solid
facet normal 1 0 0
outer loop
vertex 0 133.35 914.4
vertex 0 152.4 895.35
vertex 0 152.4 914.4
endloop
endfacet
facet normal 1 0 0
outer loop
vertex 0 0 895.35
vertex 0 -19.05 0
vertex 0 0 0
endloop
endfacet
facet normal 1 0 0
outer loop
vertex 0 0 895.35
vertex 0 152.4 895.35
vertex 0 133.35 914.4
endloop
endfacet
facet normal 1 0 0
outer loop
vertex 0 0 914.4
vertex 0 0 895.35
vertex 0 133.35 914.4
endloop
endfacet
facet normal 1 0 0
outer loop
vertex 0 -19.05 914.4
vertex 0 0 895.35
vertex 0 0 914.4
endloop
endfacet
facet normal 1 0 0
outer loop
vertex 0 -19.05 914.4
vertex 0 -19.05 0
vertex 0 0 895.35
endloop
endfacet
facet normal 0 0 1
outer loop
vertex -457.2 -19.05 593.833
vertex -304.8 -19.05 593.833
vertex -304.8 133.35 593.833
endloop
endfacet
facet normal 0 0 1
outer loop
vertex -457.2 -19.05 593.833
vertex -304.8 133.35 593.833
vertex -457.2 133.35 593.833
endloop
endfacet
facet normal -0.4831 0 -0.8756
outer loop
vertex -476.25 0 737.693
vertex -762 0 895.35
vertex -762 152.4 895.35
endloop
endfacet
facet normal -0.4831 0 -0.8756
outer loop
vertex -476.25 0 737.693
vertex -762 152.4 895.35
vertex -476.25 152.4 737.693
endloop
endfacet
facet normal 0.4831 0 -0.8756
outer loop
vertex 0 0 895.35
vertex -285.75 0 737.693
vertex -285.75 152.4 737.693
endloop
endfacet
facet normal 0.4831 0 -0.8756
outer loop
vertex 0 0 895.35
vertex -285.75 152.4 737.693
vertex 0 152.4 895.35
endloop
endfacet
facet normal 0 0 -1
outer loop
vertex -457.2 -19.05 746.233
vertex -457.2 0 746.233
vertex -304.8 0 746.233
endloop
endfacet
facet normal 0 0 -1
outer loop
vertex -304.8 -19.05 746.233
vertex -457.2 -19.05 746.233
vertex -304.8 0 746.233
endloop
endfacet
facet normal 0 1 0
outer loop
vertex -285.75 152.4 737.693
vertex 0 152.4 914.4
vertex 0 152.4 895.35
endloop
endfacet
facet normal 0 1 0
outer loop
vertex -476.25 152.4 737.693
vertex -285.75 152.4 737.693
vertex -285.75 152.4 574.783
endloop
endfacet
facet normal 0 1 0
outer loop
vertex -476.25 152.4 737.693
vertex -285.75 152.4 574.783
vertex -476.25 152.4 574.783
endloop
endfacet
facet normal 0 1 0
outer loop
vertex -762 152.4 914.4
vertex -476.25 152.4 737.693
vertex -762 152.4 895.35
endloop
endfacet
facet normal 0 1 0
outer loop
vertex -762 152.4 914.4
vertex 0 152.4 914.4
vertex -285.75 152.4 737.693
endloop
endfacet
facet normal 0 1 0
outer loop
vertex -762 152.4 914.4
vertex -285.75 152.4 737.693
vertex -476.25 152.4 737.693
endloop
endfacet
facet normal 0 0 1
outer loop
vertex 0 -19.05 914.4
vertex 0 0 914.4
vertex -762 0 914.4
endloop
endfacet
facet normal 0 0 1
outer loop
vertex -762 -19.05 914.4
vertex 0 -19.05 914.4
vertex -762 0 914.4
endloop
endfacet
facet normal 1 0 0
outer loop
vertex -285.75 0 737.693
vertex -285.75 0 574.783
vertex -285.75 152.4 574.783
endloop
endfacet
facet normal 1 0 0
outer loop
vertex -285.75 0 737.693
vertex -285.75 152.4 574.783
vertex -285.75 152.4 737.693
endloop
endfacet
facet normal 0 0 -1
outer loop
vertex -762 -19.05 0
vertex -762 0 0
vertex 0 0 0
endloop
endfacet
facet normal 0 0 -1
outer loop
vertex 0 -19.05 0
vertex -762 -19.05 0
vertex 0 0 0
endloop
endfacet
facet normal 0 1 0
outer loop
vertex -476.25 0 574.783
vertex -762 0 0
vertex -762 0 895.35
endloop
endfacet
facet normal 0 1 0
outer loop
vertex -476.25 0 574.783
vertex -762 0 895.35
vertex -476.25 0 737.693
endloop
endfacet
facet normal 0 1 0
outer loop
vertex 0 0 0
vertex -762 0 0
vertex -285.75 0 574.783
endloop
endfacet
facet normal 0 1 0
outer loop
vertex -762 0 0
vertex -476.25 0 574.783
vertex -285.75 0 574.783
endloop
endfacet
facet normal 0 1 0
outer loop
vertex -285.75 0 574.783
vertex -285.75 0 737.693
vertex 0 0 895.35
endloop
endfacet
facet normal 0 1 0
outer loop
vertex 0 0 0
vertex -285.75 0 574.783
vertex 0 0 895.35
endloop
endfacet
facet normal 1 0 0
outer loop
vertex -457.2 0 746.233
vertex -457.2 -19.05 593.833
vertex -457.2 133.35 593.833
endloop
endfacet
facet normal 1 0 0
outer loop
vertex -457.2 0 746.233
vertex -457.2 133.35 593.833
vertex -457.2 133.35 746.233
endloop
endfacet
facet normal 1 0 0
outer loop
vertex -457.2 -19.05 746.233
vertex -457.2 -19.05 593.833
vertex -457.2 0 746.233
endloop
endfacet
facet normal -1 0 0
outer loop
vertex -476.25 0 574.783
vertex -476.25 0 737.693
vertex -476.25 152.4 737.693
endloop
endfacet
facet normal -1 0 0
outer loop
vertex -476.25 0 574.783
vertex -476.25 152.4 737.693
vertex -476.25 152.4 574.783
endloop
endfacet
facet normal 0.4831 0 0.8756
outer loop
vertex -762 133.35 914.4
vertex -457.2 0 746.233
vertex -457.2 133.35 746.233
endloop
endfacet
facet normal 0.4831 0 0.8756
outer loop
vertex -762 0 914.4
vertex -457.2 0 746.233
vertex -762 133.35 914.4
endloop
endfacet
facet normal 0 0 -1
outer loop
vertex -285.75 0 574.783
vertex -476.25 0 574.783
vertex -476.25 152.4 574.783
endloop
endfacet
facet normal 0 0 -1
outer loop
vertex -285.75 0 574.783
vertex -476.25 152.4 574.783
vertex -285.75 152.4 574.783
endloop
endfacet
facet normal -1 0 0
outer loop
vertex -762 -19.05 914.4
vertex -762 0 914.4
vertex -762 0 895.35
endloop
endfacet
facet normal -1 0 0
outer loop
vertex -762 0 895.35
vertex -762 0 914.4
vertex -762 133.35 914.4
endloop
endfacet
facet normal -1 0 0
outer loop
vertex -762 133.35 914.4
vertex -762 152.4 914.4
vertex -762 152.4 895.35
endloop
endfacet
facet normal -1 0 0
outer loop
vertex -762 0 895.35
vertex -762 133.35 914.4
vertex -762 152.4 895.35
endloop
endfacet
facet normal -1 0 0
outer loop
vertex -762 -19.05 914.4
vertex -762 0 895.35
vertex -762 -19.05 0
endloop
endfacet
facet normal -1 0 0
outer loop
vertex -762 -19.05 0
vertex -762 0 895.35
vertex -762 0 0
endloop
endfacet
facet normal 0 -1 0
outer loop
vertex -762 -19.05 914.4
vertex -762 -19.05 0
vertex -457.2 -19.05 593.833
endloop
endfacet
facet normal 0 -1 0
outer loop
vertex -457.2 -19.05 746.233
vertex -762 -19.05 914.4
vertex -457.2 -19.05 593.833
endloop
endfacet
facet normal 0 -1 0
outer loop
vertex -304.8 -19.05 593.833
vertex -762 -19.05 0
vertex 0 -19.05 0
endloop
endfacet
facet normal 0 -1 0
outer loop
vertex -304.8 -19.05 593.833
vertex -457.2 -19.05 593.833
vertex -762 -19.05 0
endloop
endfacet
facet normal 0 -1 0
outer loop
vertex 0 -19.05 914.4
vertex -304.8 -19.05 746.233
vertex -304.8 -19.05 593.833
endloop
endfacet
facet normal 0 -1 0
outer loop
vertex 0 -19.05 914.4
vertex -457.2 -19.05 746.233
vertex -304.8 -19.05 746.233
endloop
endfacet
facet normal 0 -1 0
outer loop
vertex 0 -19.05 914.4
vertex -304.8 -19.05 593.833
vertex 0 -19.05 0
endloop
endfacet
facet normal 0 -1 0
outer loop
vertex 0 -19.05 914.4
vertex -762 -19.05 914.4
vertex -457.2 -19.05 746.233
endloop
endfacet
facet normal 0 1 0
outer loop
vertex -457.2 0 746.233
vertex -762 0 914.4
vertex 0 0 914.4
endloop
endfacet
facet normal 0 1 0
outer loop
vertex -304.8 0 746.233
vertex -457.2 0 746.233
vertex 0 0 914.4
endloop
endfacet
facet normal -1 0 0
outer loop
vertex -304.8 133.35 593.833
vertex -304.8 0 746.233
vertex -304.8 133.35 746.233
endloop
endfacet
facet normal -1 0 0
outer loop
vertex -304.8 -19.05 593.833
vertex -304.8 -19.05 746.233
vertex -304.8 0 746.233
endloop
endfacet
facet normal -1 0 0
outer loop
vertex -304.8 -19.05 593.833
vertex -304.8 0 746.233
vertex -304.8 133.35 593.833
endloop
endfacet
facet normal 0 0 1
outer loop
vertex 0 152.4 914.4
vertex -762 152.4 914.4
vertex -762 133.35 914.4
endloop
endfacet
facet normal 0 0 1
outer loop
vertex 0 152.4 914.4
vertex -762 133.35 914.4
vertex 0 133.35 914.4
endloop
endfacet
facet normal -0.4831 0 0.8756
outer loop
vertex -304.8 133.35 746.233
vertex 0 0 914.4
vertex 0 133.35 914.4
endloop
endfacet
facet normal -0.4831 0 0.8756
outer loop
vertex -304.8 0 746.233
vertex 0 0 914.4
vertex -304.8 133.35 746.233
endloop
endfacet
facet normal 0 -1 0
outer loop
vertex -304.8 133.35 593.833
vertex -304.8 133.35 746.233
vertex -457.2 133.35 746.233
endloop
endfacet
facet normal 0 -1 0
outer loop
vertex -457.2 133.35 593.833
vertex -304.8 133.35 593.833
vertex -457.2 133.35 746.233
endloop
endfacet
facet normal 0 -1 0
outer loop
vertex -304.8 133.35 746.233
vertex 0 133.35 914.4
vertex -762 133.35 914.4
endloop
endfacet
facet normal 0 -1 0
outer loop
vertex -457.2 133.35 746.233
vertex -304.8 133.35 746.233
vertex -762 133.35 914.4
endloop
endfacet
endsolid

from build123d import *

# Parameters (mm, degrees)
F1_DEPTH = 19.05
F2_DEPTH = 152.4
F4_DEPTH = 19.05


with BuildPart() as f1:
    # F0 (on Front) → F1 (new body)
    with BuildSketch(Plane.XZ):
        Polygon((-762, 0), (0, 0), (0, 895.35), (-285.75, 737.693186), (-285.75, 593.832731), (-285.75, 574.782731), (-476.25, 574.782731), (-476.25, 593.832731), (-476.25, 737.693186), (-762, 895.35), align=None)
        Polygon((-304.8, 746.232731), (0, 914.4), (-762, 914.4), (-457.2, 746.232731), align=None)
        Polygon((-285.75, 737.693186), (0, 895.35), (0, 914.4), (-304.8, 746.232731), (-304.8, 593.832731), (-457.2, 593.832731), (-457.2, 746.232731), (-762, 914.4), (-762, 895.35), (-476.25, 737.693186), (-476.25, 593.832731), (-476.25, 574.782731), (-285.75, 574.782731), (-285.75, 593.832731), align=None)
    extrude(amount=F1_DEPTH)

    # F0 (on Front) → F2 (join)
    with BuildSketch(Plane.XZ):
        Polygon((-285.75, 737.693186), (0, 895.35), (0, 914.4), (-304.8, 746.232731), (-304.8, 593.832731), (-457.2, 593.832731), (-457.2, 746.232731), (-762, 914.4), (-762, 895.35), (-476.25, 737.693186), (-476.25, 593.832731), (-476.25, 574.782731), (-285.75, 574.782731), (-285.75, 593.832731), align=None)
    extrude(amount=-F2_DEPTH)

    # F3 (on face) → F4 (join)
    with BuildSketch(Plane(origin=(0, 152.4, 0), x_dir=(-1, 0, 0), z_dir=(0, 1, 0))):
        Polygon((762, 914.4), (0, 914.4), (304.8, 746.232731), (304.8, 593.832731), (457.2, 593.832731), (457.2, 746.232731), align=None)
    extrude(amount=-F4_DEPTH)


solid = f1.part
